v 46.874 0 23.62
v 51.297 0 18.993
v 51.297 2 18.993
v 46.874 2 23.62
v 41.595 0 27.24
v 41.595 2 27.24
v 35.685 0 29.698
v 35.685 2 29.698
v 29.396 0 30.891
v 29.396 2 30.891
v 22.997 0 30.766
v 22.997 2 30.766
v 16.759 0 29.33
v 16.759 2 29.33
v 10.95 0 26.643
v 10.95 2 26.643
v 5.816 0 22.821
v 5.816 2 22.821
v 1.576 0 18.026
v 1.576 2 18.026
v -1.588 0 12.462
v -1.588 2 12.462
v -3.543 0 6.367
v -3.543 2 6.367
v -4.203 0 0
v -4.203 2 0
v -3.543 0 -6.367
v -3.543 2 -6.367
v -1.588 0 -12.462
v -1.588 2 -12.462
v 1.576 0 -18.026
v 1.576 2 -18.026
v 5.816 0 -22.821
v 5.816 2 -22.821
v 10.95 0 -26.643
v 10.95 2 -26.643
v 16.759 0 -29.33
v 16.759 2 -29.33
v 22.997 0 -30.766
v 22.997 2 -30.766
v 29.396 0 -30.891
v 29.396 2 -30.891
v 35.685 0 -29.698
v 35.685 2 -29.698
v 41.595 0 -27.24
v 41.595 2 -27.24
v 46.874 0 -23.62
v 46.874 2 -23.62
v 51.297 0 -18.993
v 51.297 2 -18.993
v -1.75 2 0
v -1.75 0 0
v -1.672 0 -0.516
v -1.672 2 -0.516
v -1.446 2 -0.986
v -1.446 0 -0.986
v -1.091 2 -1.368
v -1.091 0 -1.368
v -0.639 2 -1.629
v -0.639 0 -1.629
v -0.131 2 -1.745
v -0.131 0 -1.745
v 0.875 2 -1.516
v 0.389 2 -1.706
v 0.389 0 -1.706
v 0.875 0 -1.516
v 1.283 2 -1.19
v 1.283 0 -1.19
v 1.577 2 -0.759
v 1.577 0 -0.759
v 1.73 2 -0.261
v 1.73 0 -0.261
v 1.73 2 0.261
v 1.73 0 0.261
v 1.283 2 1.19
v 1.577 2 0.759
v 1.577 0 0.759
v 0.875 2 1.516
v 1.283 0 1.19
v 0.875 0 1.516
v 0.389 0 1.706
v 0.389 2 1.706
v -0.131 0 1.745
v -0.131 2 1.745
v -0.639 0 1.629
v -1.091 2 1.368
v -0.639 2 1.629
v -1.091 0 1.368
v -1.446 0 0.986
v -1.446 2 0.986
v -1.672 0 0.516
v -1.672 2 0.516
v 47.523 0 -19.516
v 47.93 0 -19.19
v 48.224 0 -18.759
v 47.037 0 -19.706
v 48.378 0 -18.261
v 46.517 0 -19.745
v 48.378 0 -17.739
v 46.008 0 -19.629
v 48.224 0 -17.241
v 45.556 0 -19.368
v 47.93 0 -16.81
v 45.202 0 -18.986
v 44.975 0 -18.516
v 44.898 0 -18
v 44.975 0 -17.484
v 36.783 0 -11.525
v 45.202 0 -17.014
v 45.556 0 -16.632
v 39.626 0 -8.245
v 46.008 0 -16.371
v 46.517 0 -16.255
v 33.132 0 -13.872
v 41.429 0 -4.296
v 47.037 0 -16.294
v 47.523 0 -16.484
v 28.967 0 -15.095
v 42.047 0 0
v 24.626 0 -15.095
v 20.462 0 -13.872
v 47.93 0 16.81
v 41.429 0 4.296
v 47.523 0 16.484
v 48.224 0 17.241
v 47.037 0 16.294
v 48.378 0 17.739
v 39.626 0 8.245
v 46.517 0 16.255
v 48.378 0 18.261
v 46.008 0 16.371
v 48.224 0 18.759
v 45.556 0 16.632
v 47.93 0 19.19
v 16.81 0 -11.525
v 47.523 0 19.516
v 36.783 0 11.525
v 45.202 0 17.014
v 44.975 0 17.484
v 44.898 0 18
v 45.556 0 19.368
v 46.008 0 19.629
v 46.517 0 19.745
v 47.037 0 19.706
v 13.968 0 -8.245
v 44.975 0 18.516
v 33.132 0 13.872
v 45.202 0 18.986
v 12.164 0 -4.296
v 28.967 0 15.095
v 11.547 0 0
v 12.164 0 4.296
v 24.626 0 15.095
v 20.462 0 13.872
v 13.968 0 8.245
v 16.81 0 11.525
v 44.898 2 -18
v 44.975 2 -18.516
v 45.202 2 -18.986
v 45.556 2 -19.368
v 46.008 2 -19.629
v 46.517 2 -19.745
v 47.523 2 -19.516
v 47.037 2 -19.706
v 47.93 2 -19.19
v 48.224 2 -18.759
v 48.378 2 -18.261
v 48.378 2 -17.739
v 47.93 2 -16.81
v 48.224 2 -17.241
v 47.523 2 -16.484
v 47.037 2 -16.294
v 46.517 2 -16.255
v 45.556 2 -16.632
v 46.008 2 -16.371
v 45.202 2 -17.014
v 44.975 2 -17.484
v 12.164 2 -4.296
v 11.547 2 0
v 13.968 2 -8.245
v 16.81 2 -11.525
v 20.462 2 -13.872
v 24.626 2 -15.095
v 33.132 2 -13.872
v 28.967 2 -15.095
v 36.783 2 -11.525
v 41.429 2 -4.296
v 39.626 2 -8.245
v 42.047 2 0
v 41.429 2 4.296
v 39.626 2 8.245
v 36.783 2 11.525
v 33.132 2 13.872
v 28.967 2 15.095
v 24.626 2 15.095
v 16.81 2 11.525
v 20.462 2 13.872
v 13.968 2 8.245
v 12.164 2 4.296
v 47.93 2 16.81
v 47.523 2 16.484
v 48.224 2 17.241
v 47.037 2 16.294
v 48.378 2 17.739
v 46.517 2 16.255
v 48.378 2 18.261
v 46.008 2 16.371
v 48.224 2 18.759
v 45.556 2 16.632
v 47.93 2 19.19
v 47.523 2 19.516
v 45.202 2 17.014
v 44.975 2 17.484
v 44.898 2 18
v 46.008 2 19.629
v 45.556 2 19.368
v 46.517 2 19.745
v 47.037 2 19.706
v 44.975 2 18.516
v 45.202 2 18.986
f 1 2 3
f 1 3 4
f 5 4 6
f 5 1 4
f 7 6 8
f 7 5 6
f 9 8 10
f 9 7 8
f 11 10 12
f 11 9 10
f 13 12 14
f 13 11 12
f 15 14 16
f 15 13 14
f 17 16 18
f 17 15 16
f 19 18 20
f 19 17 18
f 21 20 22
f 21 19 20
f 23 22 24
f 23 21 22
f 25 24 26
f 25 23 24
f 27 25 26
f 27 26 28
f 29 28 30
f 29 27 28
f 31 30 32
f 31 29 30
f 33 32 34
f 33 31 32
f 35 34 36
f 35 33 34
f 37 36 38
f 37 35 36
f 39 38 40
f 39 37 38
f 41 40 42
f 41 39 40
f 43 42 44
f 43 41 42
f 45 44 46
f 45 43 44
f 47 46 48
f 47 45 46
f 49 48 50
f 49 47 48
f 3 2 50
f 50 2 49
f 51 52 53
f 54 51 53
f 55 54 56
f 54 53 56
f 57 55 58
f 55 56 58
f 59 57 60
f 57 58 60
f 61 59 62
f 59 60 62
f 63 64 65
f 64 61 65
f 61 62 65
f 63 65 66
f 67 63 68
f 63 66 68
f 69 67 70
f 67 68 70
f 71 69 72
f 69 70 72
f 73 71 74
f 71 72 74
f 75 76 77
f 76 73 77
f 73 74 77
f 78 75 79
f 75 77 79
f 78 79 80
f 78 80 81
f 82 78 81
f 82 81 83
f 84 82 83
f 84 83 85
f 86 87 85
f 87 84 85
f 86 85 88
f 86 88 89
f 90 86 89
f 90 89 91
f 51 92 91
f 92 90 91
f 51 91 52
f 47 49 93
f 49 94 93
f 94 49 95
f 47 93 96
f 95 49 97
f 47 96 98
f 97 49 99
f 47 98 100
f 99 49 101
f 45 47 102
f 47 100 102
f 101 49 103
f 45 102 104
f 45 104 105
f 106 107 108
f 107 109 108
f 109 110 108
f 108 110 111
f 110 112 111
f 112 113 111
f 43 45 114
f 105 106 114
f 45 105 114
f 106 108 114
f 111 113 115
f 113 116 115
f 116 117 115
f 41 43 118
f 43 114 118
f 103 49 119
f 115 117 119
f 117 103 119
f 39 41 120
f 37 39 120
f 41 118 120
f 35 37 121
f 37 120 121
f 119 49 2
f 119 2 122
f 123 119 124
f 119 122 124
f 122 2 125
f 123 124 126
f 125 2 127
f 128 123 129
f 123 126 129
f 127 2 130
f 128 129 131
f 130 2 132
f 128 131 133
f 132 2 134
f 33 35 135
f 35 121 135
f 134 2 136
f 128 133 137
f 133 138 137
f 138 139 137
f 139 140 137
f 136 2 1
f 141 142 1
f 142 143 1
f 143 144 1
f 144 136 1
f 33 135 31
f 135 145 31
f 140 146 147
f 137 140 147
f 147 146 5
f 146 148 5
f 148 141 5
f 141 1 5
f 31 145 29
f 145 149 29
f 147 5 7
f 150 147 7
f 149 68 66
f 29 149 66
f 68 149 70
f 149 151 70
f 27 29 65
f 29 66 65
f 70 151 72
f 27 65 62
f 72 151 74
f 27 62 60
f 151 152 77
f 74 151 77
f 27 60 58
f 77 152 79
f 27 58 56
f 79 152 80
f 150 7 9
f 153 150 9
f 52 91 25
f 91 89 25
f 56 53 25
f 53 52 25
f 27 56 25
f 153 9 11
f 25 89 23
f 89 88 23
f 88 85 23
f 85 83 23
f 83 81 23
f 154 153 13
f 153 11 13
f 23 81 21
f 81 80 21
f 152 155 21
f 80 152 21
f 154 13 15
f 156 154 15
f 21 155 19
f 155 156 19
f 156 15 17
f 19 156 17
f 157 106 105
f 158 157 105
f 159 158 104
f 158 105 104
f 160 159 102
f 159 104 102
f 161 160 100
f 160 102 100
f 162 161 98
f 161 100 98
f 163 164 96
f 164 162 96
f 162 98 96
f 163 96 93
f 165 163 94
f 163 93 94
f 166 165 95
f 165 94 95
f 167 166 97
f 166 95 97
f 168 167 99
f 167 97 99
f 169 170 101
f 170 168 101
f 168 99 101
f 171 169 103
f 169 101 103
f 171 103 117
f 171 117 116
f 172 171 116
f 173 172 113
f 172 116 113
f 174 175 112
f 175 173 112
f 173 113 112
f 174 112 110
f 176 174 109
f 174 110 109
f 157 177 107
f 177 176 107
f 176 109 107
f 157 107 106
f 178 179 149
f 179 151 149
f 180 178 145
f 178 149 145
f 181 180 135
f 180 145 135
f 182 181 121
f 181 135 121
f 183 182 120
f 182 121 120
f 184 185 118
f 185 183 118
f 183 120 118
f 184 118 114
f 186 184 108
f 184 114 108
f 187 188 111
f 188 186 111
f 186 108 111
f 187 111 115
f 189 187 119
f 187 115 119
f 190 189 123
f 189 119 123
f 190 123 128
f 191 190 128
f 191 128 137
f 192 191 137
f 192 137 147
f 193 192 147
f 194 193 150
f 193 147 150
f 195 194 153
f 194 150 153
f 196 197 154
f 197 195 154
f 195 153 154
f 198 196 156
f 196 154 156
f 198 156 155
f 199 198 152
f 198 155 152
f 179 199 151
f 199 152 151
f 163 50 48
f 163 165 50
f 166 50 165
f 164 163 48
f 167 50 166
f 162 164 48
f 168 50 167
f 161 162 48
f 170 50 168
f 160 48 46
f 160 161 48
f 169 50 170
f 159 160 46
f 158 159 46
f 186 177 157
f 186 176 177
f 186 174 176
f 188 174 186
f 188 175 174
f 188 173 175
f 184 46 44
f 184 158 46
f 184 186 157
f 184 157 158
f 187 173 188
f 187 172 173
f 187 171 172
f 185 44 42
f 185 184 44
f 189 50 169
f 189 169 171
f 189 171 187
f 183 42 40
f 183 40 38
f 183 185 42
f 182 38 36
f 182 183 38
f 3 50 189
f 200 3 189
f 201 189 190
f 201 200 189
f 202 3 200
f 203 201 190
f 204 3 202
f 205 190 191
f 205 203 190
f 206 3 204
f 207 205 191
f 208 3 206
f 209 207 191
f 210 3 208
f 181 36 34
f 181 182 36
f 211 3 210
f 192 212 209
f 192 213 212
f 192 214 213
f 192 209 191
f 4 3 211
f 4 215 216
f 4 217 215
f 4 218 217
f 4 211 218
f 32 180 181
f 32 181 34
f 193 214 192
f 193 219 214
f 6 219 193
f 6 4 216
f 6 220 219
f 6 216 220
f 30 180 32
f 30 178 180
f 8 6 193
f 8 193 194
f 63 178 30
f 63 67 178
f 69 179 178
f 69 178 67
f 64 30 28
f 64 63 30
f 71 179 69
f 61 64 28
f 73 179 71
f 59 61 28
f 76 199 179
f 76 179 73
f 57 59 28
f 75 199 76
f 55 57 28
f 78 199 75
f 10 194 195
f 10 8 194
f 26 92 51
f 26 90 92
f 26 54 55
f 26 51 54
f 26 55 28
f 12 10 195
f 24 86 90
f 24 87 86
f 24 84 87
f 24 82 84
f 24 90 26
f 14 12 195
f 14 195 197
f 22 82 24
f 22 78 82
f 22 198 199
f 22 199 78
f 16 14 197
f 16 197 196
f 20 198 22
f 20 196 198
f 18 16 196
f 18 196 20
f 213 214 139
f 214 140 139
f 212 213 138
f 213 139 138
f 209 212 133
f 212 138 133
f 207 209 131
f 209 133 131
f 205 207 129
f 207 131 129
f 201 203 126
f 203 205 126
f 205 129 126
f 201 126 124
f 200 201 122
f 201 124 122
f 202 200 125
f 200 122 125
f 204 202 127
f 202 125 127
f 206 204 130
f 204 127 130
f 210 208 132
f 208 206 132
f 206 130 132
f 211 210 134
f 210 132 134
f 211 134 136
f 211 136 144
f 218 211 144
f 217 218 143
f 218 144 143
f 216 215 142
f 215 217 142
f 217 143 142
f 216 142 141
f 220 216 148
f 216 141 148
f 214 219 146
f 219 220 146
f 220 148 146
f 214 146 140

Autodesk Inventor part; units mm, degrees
ref_plane "YZ Plane" through (0, 0, 0) normal (1, 0, 0) x (0, 1, 0)
ref_plane "XZ Plane" through (0, 0, 0) normal (0, 1, 0) x (-1, 0, 0)
ref_plane "XY Plane" through (0, 0, 0) normal (0, 0, 1) x (1, 0, 0)
sketch "Sketch1" plane through (0, 0, 0) normal (0, 1, 0) x (-1, 0, 0)
  circle A0 centre (0, 0) radius 1.75
  line L0 (0, 0) -> (-46.6476, -18) construction
  line L1 (-46.6476, -18) -> (-46.6476, 18) construction
  line L2 (-46.6476, 18) -> (0, 0) construction
  circle A1 centre (-46.6476, -18) radius 1.75 construction
  circle A2 centre (-46.6476, -18) radius 1.75
  circle A3 centre (-46.6476, 18) radius 1.75
  circle A4 centre (-34.2997, 0) radius 12.3479 construction
  arc A5 (0, 0) -> (-46.6476, 18) centre (-26.7967, 0) ccw construction
  arc A6 (-46.6476, 18) -> (-46.6476, -18) centre (-26.7967, 0) ccw construction
  arc A7 (-46.6476, -18) -> (0, 0) centre (-26.7967, 0) ccw construction
  circle A8 centre (-26.7967, 0) radius 31
  circle A9 centre (-26.7967, 0) radius 15.25
  line L3 (-51.2967, 18.9934) -> (-51.2967, -18.9934)
  dimension "d4" = 3.5
  dimension "d5" = 50
  dimension "d6" = 36
  dimension "d7" = 18
  dimension "d8" = 3.5
  dimension "d9" = 3.5
  dimension "d10" = 3.5
  dimension "d11" = 62
  dimension "d12" = 30.5
  dimension "d15" = 24.5
extrude "Extrusion1" add sketch "Sketch1" along normal blind 2 contours A8 L3 picked at (-48.2134, 0)
properties part number "00_Zeiss_Axiotech_Eyepiecemount"
